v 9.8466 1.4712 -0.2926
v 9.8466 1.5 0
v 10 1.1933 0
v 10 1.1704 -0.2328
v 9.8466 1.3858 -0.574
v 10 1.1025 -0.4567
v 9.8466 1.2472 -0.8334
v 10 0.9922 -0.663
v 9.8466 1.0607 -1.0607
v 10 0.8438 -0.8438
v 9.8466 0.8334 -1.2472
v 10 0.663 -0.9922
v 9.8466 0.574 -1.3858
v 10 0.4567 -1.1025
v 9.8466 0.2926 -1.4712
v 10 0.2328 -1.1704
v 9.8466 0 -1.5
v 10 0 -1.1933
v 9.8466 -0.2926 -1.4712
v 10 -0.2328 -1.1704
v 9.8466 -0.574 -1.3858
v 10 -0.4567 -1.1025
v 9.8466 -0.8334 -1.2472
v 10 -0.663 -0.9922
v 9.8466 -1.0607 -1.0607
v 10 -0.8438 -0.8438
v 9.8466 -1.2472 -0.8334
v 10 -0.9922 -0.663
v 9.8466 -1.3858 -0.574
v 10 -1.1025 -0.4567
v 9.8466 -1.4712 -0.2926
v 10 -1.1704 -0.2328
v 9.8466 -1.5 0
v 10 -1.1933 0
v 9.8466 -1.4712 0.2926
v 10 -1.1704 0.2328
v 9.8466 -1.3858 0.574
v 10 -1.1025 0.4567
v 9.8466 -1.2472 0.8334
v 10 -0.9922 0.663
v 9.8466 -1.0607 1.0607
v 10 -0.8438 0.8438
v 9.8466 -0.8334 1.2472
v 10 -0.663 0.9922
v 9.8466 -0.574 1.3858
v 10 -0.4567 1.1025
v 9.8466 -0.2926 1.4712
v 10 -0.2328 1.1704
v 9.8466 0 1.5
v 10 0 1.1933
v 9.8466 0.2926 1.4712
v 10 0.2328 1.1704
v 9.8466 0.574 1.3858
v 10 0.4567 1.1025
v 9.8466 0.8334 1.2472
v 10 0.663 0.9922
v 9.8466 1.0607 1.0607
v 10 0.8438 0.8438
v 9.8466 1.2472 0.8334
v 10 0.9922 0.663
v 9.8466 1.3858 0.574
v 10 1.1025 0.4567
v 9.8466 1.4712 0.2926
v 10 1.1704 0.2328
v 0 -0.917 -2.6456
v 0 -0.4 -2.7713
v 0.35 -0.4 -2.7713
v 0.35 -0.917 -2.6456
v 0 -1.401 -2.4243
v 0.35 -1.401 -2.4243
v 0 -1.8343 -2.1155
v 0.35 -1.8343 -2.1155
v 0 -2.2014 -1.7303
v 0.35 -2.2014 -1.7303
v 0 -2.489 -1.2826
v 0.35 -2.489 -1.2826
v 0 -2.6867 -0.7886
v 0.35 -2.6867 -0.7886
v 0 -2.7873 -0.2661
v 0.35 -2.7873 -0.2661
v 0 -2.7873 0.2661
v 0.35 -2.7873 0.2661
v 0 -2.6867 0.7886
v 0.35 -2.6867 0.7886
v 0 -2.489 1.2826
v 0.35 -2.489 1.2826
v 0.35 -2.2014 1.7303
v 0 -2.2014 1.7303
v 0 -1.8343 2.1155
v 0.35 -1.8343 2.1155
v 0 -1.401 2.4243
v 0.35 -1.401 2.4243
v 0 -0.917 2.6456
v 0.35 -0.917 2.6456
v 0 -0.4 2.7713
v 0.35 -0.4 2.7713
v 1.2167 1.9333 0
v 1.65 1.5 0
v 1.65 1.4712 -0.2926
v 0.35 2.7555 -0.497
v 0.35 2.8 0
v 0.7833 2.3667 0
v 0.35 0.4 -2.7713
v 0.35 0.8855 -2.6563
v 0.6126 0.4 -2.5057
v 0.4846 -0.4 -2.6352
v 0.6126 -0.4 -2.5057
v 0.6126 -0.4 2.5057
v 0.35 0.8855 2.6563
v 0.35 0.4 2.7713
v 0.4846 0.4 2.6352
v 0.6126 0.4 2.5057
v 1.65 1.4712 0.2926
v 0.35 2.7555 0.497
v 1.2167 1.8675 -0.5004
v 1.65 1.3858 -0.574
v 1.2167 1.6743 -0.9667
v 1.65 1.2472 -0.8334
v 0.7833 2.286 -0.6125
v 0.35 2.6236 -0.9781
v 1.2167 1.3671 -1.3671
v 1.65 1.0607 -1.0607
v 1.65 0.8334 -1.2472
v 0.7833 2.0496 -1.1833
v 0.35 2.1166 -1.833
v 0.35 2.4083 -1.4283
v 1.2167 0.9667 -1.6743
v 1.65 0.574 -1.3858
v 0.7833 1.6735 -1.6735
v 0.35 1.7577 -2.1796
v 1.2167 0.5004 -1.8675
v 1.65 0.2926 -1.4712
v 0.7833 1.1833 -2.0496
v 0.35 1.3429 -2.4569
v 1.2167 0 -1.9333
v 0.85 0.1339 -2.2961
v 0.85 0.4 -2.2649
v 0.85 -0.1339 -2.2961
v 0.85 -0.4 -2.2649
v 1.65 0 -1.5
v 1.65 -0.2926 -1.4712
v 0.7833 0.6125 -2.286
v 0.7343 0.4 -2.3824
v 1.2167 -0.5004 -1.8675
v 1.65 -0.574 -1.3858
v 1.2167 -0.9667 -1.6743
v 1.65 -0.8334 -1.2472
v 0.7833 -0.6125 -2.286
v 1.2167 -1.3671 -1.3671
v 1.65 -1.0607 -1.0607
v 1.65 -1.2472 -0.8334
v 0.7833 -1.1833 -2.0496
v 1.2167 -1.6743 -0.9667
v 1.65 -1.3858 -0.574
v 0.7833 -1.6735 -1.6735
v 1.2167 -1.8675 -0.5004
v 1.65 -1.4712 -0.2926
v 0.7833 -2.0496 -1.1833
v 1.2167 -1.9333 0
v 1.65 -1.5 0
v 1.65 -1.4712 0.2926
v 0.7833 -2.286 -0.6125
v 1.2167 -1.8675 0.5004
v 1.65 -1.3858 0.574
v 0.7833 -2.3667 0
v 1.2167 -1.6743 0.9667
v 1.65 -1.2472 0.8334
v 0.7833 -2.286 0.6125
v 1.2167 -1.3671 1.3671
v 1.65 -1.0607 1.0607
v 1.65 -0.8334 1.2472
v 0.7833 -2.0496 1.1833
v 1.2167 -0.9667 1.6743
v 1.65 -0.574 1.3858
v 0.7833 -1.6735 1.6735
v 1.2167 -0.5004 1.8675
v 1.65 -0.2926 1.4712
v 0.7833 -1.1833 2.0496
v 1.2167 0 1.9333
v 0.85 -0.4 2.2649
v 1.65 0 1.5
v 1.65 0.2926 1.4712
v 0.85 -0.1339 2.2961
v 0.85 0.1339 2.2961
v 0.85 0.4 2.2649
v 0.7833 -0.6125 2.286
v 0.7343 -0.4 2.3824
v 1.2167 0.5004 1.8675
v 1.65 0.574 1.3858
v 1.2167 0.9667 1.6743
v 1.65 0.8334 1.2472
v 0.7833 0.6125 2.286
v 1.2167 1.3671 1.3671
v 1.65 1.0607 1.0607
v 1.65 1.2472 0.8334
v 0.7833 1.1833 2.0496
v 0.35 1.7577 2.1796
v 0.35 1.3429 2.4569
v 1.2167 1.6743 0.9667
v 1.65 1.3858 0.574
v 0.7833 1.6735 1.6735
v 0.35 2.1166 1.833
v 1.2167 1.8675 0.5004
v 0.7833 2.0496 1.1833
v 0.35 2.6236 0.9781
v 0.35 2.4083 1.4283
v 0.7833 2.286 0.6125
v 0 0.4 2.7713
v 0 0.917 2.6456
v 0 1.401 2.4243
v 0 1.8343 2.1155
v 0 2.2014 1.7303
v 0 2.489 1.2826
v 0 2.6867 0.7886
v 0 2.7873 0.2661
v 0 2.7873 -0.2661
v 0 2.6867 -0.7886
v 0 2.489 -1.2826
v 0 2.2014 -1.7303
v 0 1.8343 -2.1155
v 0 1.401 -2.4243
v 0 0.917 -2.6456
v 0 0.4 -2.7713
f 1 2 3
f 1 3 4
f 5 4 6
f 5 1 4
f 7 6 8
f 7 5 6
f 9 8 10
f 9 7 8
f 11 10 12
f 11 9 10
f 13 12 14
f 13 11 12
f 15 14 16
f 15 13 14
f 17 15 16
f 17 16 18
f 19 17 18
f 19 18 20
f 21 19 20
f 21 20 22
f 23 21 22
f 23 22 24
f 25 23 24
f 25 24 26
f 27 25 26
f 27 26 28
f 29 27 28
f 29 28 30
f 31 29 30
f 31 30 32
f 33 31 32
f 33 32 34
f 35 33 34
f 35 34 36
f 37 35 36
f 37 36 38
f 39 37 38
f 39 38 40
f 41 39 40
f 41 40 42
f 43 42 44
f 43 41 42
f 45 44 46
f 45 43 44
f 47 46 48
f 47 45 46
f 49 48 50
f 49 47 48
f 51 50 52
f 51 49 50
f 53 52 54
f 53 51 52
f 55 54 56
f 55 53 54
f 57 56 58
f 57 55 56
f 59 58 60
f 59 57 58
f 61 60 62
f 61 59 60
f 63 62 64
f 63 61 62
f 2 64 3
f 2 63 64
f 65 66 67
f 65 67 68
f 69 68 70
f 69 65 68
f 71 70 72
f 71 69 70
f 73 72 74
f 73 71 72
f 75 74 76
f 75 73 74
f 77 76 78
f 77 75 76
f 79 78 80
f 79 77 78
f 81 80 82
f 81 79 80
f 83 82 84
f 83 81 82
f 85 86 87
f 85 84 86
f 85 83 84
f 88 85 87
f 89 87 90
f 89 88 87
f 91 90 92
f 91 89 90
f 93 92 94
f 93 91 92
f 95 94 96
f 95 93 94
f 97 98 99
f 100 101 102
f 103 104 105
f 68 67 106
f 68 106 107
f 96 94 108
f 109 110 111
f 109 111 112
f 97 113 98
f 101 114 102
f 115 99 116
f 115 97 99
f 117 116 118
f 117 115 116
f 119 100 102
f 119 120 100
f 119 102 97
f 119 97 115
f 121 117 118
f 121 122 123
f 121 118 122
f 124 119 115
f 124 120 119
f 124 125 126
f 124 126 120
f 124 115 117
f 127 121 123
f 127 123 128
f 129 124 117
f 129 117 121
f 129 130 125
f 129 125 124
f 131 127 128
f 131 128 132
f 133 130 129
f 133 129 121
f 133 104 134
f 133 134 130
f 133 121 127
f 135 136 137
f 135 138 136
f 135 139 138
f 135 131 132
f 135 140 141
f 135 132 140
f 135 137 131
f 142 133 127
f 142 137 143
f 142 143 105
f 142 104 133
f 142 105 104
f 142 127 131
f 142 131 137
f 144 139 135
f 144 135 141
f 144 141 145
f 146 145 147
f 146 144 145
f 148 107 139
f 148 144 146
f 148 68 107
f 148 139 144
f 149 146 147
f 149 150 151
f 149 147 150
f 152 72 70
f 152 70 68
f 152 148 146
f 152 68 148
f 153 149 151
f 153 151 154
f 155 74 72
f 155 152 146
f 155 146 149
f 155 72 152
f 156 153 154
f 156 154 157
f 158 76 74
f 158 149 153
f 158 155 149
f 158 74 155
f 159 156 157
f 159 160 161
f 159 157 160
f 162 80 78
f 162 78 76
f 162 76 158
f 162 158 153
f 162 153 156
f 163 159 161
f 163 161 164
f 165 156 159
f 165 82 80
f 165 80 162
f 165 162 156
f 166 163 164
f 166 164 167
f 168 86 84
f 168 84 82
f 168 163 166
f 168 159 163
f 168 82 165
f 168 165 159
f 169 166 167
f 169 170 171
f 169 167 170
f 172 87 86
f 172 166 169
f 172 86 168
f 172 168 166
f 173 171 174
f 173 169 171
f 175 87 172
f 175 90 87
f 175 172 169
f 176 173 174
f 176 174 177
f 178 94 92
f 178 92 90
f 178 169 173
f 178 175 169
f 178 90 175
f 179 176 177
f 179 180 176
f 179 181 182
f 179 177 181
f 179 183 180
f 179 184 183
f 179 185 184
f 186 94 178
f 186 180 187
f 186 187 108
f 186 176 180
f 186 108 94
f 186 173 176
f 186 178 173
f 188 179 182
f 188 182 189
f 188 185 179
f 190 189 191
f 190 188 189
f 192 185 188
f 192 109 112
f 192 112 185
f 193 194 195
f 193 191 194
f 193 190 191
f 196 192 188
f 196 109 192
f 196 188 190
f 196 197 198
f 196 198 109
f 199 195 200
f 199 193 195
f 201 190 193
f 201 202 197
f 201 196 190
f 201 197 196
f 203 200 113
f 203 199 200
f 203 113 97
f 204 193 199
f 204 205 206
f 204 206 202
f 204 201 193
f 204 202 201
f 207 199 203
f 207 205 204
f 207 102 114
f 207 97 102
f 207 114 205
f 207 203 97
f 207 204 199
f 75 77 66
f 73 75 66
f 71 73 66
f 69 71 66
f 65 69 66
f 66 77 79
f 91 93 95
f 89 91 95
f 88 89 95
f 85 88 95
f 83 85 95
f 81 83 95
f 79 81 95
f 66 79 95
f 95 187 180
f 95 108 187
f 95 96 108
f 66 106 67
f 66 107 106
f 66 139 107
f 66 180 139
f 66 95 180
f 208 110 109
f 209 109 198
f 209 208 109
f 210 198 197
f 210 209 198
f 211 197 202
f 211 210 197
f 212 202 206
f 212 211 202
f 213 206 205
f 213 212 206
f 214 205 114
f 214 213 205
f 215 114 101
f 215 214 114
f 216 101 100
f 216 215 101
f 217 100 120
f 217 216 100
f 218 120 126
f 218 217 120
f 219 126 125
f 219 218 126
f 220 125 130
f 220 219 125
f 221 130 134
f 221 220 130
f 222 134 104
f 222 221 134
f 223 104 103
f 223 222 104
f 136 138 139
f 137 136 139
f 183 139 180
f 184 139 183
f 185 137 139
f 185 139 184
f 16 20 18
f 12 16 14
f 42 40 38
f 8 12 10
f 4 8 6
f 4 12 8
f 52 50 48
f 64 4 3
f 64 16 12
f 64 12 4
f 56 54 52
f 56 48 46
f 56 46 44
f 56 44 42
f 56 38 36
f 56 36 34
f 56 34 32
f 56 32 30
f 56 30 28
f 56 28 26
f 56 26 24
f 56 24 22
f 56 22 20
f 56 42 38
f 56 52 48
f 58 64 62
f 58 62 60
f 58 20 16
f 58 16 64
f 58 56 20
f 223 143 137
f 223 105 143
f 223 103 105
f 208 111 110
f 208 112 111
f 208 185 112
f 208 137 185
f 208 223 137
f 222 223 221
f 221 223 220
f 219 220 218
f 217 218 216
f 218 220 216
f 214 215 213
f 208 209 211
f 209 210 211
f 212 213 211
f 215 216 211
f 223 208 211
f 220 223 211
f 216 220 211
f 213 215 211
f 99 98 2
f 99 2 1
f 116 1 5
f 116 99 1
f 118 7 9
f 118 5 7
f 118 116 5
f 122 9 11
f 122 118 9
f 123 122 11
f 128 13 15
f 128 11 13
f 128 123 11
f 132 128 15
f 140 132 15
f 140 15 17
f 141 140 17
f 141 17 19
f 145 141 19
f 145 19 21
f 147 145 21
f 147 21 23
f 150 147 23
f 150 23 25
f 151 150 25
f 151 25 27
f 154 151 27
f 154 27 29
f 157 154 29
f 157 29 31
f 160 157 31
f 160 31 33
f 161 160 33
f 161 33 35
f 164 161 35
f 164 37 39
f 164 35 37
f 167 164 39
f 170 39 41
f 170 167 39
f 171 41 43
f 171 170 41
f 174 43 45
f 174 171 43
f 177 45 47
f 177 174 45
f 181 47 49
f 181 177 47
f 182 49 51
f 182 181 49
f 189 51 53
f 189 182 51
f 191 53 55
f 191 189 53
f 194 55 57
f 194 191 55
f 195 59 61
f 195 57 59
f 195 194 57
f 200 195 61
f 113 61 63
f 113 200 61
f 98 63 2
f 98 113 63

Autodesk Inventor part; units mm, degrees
ref_plane "YZ Plane" through (0, 0, 0) normal (1, 0, 0) x (0, 1, 0)
ref_plane "XZ Plane" through (0, 0, 0) normal (0, 1, 0) x (-1, 0, 0)
sketch "Sketch1" plane through (0, 0, 0) normal (0, 0, 1) x (1, 0, 0)
  line L0 (0, 0) -> (10, 0)
  line L1 (10, 0) -> (10, 1.5)
  line L2 (10, 1.5) -> (2.65, 1.5)
  line L3 (2.65, 1.5) -> (2.3433, 1.5)
  line L4 (2.3433, 1.5) -> (1.65, 1.5)
  line L5 (1.65, 1.5) -> (0.35, 2.8)
  line L6 (0.35, 2.8) -> (0, 2.8)
  line L7 (0, 2.8) -> (0, 0)
  line L8 (2.65, 1.5) -> (1.65, 1.5) construction
  line L9 (-2, 0) -> (12, 0) projected
  line L10 (0, 3.36) -> (0, -0.56) projected
  dimension "d0" = 10
  dimension "d1" = 45
  dimension "d2" = 0.3067
  dimension "d3" = 7.35
  dimension "d4" = 1.65
  dimension "d5" = 3
  dimension "d6" = 3
  dimension "d7" = 5.6
revolve "Body" add sketch "Sketch1" angle 360 about axis through (0, 0, 0) along (1, 0, 0)
sketch "Sketch2" plane through (0, 0, 0) normal (-1, 0, 0) x (0, 0, 1)
  line L0 (2.8, -0.4) -> (-2.8, -0.4)
  line L1 (-2.8, -0.4) -> (-2.8, 0.4)
  line L2 (-2.8, 0.4) -> (2.8, 0.4)
  line L3 (2.8, 0.4) -> (2.8, -0.4)
  line L4 (0, 0.4) -> (0, -0.4) construction
  line L5 (-2.8, 0) -> (2.8, 0) construction
  line L6 (0, 2.8) -> (0, 0) projected
  dimension "d15" = 0.8
  dimension "d16" = 5.6
extrude "Slot" cut sketch "Sketch2" against normal blind 0.85
thread "Thread" size "M3x0.5" class "6g" standard "ISO Metric profile" length 7.35
chamfer "Chamfer1" distance 0.3067 distance2 0.1534 1 edges at (10, -1.5, 0) measured on face at (10, 0.263, 0.1197)
ref_plane "Work Plane1" through (33.575, 0, 0) normal (0, 0, -1) x (1, 0, 0)
equation "\"d0\" = NLG"
equation "\"d1\" = 0.5 * SEWI"
equation "\"d2\" = GAL"
equation "\"d3\" = GEL"
equation "\"d4\" = KOH"
equation "\"d5\" = BDM"
equation "\"d6\" = GD"
equation "\"d7\" = KOD"
equation "\"d15\" = SBR"
equation "\"d16\" = KOD"
equation "\"d8\" = STI"
equation "\"d10\" = GEL"
equation "\"d12\" = -0.5 * SPD + 0.5 * GD"
equation "\"d13\" = 0.5 * GAL"
equation "\"NLG\" = 10"
equation "\"GAL\" = 0.61345 * PTC"
equation "\"GEL\" = 7.35"
equation "\"KOH\" = 1.65"
equation "\"KOD\" = 5.6"
equation "\"SEWI\" = 90deg"
equation "\"BDM\" = NND"
equation "\"GD\" = NND"
equation "\"SBR\" = 0.8"
equation "\"STI\" = 0.85"
equation "\"SPD\" = NND - 1.2269 * PTC"
equation "\"GUL\" = 0.61345 * PTC"
equation "\"PTC\" = 0.5"
equation "\"EPV\" = 3.15"
equation "\"THREADDIA\" = 3"
equation "\"TOA\" = 30deg"
equation "\"NND\" = 3"
equation "\"GD1\" = THREADDIA - 1.2269 * PTC"
properties part number "DIN 963 - M3 x 10" material "Steel, Mild"
